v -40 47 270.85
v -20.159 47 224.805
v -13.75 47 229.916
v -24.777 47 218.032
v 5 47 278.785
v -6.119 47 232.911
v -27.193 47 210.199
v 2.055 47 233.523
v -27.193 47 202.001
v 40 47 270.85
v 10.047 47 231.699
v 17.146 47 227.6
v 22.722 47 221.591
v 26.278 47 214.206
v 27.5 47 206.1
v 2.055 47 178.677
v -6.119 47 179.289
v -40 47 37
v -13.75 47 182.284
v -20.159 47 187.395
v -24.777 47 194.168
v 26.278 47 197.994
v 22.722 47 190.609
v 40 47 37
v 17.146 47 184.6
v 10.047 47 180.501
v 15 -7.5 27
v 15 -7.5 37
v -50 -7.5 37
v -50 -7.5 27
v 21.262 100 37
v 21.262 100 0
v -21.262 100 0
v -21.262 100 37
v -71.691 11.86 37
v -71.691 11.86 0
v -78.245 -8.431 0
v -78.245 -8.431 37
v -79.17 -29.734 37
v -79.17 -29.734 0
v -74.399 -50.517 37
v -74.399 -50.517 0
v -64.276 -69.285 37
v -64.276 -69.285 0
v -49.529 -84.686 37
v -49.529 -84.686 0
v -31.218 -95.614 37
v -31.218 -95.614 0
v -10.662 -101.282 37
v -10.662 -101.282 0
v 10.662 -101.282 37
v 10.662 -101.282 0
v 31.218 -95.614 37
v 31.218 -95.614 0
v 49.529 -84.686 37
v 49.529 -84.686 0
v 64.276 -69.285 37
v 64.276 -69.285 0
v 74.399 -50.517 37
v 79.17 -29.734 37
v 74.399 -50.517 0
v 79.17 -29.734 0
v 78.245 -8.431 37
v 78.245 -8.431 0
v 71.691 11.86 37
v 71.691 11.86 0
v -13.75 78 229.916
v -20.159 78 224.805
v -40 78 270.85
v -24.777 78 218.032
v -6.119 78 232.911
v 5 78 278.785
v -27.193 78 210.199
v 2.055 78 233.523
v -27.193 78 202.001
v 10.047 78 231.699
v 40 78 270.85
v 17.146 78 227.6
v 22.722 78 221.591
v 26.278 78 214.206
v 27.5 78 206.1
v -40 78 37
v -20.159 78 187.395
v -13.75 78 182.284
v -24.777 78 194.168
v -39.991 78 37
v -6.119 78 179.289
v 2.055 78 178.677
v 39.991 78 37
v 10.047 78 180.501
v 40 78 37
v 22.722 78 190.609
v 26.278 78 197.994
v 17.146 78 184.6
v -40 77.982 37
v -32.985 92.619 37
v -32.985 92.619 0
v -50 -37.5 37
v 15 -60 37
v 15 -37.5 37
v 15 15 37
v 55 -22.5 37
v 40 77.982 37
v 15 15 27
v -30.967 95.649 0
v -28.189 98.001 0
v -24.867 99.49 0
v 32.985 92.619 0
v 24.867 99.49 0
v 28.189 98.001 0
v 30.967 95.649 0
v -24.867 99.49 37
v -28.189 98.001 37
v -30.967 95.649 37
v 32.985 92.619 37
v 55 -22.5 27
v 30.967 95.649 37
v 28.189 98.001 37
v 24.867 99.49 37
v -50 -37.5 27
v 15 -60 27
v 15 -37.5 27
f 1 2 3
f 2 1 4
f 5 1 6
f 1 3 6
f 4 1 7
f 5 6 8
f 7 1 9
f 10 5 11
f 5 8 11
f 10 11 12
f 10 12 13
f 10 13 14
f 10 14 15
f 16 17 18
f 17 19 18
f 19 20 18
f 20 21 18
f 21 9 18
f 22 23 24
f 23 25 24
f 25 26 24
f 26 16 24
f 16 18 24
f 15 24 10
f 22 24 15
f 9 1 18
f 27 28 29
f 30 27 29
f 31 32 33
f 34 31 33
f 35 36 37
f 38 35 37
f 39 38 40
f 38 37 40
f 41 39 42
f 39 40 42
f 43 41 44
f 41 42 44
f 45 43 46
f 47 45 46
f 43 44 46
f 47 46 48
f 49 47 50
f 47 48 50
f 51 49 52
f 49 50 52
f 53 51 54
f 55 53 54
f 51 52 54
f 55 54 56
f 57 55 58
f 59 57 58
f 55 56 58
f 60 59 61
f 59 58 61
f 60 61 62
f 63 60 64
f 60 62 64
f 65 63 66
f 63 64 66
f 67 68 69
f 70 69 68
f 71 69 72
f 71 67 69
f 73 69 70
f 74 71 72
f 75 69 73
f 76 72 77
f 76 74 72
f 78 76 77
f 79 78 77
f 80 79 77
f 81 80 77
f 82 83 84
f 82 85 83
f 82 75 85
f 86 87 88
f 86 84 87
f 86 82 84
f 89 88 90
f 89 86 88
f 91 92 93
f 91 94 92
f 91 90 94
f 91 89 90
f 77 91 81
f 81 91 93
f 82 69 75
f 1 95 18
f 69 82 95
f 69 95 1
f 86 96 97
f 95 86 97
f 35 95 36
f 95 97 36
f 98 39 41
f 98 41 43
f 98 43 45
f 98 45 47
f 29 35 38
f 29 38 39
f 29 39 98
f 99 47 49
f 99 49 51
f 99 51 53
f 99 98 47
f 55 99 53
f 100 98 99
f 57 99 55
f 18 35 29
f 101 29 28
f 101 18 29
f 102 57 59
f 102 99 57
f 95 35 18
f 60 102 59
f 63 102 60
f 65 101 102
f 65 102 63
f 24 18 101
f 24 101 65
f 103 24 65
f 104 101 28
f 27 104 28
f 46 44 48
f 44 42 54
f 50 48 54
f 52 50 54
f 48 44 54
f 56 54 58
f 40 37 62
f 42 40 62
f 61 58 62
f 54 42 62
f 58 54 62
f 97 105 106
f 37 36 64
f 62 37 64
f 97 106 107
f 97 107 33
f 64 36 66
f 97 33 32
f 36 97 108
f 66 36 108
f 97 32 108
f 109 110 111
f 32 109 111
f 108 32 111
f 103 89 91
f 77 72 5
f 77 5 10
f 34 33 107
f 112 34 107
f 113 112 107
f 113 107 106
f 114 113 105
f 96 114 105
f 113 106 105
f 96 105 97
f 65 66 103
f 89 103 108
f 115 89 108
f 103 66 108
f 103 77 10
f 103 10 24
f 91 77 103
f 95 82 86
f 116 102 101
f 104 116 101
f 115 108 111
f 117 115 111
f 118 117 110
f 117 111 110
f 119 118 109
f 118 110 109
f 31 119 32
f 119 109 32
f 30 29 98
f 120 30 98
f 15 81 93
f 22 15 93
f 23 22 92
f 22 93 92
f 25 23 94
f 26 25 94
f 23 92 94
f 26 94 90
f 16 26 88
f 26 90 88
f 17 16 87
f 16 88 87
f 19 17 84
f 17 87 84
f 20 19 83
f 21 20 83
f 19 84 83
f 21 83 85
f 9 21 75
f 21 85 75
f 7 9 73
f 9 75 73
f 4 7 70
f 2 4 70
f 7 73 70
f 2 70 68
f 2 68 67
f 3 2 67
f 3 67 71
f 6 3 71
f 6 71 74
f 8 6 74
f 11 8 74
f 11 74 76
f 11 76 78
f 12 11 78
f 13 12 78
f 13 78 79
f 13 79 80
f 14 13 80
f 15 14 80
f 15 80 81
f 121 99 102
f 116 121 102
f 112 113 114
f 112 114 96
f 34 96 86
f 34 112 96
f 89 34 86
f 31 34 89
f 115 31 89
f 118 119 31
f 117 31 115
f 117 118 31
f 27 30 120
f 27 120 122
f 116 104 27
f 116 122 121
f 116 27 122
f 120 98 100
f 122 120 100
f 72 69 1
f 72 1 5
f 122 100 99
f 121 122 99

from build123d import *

# Parameters (mm, degrees)
SKETCH1_R           = 79.5
BOSS_EXTRUDE1_DEPTH = 37
SKETCH2_W           = 80
SKETCH2_H           = 31
BOSS_EXTRUDE2_DEPTH = 212.65
BOSS_EXTRUDE3_DEPTH = 31
CUT_EXTRUDE1_DEPTH  = 10
SKETCH5_R           = 27.5
CUT_EXTRUDE2_DEPTH  = 181


with BuildPart() as part:
    # Sketch1 → Boss-Extrude1 (new body)
    with BuildSketch(Plane.XY):
        with BuildLine():
            ThreePointArc((-21.261874522, 100), (-28.188531545, 98.000973706), (-32.984947104, 92.618680381))
            Line((-32.984947104, 92.618680381), (-71.691097716, 11.860391562))
            ThreePointArc((-71.691097716, 11.860391562), (0, 57), (71.691097716, 11.860391562))
            Line((71.691097716, 11.860391562), (32.984947104, 92.618680381))
            ThreePointArc((32.984947104, 92.618680381), (28.188531545, 98.000973706), (21.261874522, 100))
            Line((21.261874522, 100), (-21.261874522, 100))
        make_face()
        with Locations((0, -22.5)):
            Circle(SKETCH1_R)
    extrude(amount=BOSS_EXTRUDE1_DEPTH)

    # Sketch2 → Boss-Extrude2 (add)
    with BuildSketch(Plane.XY.offset(37)):
        with Locations((0, 62.5)):
            Rectangle(SKETCH2_W, SKETCH2_H)
    extrude(amount=BOSS_EXTRUDE2_DEPTH)

    # Sketch3 → Boss-Extrude3 (add)
    with BuildSketch(Plane(origin=(0, 78, 0), x_dir=(1, 0, 0), z_dir=(0, 1, 0))):
        Polygon((5, -278.784714132), (40, -270.85), (40, -249.65), (-40, -249.65), (-40, -270.85), align=None)
    extrude(amount=-BOSS_EXTRUDE3_DEPTH)

    # Sketch4 → Cut-Extrude1 (cut)
    with BuildSketch(Plane.XY.offset(37)):
        Polygon((55, -22.5), (15, 15), (15, -7.5), (-50, -7.5), (-50, -37.5), (15, -37.5), (15, -60), align=None)
    extrude(amount=-CUT_EXTRUDE1_DEPTH, mode=Mode.SUBTRACT)

    # Sketch5 → Cut-Extrude2 (cut, through all)
    with BuildSketch(Plane(origin=(0, 78, 0), x_dir=(1, 0, 0), z_dir=(0, 1, 0))):
        with Locations((0, -206.1)):
            Circle(SKETCH5_R)
    extrude(amount=-CUT_EXTRUDE2_DEPTH, mode=Mode.SUBTRACT)


solid = part.part
